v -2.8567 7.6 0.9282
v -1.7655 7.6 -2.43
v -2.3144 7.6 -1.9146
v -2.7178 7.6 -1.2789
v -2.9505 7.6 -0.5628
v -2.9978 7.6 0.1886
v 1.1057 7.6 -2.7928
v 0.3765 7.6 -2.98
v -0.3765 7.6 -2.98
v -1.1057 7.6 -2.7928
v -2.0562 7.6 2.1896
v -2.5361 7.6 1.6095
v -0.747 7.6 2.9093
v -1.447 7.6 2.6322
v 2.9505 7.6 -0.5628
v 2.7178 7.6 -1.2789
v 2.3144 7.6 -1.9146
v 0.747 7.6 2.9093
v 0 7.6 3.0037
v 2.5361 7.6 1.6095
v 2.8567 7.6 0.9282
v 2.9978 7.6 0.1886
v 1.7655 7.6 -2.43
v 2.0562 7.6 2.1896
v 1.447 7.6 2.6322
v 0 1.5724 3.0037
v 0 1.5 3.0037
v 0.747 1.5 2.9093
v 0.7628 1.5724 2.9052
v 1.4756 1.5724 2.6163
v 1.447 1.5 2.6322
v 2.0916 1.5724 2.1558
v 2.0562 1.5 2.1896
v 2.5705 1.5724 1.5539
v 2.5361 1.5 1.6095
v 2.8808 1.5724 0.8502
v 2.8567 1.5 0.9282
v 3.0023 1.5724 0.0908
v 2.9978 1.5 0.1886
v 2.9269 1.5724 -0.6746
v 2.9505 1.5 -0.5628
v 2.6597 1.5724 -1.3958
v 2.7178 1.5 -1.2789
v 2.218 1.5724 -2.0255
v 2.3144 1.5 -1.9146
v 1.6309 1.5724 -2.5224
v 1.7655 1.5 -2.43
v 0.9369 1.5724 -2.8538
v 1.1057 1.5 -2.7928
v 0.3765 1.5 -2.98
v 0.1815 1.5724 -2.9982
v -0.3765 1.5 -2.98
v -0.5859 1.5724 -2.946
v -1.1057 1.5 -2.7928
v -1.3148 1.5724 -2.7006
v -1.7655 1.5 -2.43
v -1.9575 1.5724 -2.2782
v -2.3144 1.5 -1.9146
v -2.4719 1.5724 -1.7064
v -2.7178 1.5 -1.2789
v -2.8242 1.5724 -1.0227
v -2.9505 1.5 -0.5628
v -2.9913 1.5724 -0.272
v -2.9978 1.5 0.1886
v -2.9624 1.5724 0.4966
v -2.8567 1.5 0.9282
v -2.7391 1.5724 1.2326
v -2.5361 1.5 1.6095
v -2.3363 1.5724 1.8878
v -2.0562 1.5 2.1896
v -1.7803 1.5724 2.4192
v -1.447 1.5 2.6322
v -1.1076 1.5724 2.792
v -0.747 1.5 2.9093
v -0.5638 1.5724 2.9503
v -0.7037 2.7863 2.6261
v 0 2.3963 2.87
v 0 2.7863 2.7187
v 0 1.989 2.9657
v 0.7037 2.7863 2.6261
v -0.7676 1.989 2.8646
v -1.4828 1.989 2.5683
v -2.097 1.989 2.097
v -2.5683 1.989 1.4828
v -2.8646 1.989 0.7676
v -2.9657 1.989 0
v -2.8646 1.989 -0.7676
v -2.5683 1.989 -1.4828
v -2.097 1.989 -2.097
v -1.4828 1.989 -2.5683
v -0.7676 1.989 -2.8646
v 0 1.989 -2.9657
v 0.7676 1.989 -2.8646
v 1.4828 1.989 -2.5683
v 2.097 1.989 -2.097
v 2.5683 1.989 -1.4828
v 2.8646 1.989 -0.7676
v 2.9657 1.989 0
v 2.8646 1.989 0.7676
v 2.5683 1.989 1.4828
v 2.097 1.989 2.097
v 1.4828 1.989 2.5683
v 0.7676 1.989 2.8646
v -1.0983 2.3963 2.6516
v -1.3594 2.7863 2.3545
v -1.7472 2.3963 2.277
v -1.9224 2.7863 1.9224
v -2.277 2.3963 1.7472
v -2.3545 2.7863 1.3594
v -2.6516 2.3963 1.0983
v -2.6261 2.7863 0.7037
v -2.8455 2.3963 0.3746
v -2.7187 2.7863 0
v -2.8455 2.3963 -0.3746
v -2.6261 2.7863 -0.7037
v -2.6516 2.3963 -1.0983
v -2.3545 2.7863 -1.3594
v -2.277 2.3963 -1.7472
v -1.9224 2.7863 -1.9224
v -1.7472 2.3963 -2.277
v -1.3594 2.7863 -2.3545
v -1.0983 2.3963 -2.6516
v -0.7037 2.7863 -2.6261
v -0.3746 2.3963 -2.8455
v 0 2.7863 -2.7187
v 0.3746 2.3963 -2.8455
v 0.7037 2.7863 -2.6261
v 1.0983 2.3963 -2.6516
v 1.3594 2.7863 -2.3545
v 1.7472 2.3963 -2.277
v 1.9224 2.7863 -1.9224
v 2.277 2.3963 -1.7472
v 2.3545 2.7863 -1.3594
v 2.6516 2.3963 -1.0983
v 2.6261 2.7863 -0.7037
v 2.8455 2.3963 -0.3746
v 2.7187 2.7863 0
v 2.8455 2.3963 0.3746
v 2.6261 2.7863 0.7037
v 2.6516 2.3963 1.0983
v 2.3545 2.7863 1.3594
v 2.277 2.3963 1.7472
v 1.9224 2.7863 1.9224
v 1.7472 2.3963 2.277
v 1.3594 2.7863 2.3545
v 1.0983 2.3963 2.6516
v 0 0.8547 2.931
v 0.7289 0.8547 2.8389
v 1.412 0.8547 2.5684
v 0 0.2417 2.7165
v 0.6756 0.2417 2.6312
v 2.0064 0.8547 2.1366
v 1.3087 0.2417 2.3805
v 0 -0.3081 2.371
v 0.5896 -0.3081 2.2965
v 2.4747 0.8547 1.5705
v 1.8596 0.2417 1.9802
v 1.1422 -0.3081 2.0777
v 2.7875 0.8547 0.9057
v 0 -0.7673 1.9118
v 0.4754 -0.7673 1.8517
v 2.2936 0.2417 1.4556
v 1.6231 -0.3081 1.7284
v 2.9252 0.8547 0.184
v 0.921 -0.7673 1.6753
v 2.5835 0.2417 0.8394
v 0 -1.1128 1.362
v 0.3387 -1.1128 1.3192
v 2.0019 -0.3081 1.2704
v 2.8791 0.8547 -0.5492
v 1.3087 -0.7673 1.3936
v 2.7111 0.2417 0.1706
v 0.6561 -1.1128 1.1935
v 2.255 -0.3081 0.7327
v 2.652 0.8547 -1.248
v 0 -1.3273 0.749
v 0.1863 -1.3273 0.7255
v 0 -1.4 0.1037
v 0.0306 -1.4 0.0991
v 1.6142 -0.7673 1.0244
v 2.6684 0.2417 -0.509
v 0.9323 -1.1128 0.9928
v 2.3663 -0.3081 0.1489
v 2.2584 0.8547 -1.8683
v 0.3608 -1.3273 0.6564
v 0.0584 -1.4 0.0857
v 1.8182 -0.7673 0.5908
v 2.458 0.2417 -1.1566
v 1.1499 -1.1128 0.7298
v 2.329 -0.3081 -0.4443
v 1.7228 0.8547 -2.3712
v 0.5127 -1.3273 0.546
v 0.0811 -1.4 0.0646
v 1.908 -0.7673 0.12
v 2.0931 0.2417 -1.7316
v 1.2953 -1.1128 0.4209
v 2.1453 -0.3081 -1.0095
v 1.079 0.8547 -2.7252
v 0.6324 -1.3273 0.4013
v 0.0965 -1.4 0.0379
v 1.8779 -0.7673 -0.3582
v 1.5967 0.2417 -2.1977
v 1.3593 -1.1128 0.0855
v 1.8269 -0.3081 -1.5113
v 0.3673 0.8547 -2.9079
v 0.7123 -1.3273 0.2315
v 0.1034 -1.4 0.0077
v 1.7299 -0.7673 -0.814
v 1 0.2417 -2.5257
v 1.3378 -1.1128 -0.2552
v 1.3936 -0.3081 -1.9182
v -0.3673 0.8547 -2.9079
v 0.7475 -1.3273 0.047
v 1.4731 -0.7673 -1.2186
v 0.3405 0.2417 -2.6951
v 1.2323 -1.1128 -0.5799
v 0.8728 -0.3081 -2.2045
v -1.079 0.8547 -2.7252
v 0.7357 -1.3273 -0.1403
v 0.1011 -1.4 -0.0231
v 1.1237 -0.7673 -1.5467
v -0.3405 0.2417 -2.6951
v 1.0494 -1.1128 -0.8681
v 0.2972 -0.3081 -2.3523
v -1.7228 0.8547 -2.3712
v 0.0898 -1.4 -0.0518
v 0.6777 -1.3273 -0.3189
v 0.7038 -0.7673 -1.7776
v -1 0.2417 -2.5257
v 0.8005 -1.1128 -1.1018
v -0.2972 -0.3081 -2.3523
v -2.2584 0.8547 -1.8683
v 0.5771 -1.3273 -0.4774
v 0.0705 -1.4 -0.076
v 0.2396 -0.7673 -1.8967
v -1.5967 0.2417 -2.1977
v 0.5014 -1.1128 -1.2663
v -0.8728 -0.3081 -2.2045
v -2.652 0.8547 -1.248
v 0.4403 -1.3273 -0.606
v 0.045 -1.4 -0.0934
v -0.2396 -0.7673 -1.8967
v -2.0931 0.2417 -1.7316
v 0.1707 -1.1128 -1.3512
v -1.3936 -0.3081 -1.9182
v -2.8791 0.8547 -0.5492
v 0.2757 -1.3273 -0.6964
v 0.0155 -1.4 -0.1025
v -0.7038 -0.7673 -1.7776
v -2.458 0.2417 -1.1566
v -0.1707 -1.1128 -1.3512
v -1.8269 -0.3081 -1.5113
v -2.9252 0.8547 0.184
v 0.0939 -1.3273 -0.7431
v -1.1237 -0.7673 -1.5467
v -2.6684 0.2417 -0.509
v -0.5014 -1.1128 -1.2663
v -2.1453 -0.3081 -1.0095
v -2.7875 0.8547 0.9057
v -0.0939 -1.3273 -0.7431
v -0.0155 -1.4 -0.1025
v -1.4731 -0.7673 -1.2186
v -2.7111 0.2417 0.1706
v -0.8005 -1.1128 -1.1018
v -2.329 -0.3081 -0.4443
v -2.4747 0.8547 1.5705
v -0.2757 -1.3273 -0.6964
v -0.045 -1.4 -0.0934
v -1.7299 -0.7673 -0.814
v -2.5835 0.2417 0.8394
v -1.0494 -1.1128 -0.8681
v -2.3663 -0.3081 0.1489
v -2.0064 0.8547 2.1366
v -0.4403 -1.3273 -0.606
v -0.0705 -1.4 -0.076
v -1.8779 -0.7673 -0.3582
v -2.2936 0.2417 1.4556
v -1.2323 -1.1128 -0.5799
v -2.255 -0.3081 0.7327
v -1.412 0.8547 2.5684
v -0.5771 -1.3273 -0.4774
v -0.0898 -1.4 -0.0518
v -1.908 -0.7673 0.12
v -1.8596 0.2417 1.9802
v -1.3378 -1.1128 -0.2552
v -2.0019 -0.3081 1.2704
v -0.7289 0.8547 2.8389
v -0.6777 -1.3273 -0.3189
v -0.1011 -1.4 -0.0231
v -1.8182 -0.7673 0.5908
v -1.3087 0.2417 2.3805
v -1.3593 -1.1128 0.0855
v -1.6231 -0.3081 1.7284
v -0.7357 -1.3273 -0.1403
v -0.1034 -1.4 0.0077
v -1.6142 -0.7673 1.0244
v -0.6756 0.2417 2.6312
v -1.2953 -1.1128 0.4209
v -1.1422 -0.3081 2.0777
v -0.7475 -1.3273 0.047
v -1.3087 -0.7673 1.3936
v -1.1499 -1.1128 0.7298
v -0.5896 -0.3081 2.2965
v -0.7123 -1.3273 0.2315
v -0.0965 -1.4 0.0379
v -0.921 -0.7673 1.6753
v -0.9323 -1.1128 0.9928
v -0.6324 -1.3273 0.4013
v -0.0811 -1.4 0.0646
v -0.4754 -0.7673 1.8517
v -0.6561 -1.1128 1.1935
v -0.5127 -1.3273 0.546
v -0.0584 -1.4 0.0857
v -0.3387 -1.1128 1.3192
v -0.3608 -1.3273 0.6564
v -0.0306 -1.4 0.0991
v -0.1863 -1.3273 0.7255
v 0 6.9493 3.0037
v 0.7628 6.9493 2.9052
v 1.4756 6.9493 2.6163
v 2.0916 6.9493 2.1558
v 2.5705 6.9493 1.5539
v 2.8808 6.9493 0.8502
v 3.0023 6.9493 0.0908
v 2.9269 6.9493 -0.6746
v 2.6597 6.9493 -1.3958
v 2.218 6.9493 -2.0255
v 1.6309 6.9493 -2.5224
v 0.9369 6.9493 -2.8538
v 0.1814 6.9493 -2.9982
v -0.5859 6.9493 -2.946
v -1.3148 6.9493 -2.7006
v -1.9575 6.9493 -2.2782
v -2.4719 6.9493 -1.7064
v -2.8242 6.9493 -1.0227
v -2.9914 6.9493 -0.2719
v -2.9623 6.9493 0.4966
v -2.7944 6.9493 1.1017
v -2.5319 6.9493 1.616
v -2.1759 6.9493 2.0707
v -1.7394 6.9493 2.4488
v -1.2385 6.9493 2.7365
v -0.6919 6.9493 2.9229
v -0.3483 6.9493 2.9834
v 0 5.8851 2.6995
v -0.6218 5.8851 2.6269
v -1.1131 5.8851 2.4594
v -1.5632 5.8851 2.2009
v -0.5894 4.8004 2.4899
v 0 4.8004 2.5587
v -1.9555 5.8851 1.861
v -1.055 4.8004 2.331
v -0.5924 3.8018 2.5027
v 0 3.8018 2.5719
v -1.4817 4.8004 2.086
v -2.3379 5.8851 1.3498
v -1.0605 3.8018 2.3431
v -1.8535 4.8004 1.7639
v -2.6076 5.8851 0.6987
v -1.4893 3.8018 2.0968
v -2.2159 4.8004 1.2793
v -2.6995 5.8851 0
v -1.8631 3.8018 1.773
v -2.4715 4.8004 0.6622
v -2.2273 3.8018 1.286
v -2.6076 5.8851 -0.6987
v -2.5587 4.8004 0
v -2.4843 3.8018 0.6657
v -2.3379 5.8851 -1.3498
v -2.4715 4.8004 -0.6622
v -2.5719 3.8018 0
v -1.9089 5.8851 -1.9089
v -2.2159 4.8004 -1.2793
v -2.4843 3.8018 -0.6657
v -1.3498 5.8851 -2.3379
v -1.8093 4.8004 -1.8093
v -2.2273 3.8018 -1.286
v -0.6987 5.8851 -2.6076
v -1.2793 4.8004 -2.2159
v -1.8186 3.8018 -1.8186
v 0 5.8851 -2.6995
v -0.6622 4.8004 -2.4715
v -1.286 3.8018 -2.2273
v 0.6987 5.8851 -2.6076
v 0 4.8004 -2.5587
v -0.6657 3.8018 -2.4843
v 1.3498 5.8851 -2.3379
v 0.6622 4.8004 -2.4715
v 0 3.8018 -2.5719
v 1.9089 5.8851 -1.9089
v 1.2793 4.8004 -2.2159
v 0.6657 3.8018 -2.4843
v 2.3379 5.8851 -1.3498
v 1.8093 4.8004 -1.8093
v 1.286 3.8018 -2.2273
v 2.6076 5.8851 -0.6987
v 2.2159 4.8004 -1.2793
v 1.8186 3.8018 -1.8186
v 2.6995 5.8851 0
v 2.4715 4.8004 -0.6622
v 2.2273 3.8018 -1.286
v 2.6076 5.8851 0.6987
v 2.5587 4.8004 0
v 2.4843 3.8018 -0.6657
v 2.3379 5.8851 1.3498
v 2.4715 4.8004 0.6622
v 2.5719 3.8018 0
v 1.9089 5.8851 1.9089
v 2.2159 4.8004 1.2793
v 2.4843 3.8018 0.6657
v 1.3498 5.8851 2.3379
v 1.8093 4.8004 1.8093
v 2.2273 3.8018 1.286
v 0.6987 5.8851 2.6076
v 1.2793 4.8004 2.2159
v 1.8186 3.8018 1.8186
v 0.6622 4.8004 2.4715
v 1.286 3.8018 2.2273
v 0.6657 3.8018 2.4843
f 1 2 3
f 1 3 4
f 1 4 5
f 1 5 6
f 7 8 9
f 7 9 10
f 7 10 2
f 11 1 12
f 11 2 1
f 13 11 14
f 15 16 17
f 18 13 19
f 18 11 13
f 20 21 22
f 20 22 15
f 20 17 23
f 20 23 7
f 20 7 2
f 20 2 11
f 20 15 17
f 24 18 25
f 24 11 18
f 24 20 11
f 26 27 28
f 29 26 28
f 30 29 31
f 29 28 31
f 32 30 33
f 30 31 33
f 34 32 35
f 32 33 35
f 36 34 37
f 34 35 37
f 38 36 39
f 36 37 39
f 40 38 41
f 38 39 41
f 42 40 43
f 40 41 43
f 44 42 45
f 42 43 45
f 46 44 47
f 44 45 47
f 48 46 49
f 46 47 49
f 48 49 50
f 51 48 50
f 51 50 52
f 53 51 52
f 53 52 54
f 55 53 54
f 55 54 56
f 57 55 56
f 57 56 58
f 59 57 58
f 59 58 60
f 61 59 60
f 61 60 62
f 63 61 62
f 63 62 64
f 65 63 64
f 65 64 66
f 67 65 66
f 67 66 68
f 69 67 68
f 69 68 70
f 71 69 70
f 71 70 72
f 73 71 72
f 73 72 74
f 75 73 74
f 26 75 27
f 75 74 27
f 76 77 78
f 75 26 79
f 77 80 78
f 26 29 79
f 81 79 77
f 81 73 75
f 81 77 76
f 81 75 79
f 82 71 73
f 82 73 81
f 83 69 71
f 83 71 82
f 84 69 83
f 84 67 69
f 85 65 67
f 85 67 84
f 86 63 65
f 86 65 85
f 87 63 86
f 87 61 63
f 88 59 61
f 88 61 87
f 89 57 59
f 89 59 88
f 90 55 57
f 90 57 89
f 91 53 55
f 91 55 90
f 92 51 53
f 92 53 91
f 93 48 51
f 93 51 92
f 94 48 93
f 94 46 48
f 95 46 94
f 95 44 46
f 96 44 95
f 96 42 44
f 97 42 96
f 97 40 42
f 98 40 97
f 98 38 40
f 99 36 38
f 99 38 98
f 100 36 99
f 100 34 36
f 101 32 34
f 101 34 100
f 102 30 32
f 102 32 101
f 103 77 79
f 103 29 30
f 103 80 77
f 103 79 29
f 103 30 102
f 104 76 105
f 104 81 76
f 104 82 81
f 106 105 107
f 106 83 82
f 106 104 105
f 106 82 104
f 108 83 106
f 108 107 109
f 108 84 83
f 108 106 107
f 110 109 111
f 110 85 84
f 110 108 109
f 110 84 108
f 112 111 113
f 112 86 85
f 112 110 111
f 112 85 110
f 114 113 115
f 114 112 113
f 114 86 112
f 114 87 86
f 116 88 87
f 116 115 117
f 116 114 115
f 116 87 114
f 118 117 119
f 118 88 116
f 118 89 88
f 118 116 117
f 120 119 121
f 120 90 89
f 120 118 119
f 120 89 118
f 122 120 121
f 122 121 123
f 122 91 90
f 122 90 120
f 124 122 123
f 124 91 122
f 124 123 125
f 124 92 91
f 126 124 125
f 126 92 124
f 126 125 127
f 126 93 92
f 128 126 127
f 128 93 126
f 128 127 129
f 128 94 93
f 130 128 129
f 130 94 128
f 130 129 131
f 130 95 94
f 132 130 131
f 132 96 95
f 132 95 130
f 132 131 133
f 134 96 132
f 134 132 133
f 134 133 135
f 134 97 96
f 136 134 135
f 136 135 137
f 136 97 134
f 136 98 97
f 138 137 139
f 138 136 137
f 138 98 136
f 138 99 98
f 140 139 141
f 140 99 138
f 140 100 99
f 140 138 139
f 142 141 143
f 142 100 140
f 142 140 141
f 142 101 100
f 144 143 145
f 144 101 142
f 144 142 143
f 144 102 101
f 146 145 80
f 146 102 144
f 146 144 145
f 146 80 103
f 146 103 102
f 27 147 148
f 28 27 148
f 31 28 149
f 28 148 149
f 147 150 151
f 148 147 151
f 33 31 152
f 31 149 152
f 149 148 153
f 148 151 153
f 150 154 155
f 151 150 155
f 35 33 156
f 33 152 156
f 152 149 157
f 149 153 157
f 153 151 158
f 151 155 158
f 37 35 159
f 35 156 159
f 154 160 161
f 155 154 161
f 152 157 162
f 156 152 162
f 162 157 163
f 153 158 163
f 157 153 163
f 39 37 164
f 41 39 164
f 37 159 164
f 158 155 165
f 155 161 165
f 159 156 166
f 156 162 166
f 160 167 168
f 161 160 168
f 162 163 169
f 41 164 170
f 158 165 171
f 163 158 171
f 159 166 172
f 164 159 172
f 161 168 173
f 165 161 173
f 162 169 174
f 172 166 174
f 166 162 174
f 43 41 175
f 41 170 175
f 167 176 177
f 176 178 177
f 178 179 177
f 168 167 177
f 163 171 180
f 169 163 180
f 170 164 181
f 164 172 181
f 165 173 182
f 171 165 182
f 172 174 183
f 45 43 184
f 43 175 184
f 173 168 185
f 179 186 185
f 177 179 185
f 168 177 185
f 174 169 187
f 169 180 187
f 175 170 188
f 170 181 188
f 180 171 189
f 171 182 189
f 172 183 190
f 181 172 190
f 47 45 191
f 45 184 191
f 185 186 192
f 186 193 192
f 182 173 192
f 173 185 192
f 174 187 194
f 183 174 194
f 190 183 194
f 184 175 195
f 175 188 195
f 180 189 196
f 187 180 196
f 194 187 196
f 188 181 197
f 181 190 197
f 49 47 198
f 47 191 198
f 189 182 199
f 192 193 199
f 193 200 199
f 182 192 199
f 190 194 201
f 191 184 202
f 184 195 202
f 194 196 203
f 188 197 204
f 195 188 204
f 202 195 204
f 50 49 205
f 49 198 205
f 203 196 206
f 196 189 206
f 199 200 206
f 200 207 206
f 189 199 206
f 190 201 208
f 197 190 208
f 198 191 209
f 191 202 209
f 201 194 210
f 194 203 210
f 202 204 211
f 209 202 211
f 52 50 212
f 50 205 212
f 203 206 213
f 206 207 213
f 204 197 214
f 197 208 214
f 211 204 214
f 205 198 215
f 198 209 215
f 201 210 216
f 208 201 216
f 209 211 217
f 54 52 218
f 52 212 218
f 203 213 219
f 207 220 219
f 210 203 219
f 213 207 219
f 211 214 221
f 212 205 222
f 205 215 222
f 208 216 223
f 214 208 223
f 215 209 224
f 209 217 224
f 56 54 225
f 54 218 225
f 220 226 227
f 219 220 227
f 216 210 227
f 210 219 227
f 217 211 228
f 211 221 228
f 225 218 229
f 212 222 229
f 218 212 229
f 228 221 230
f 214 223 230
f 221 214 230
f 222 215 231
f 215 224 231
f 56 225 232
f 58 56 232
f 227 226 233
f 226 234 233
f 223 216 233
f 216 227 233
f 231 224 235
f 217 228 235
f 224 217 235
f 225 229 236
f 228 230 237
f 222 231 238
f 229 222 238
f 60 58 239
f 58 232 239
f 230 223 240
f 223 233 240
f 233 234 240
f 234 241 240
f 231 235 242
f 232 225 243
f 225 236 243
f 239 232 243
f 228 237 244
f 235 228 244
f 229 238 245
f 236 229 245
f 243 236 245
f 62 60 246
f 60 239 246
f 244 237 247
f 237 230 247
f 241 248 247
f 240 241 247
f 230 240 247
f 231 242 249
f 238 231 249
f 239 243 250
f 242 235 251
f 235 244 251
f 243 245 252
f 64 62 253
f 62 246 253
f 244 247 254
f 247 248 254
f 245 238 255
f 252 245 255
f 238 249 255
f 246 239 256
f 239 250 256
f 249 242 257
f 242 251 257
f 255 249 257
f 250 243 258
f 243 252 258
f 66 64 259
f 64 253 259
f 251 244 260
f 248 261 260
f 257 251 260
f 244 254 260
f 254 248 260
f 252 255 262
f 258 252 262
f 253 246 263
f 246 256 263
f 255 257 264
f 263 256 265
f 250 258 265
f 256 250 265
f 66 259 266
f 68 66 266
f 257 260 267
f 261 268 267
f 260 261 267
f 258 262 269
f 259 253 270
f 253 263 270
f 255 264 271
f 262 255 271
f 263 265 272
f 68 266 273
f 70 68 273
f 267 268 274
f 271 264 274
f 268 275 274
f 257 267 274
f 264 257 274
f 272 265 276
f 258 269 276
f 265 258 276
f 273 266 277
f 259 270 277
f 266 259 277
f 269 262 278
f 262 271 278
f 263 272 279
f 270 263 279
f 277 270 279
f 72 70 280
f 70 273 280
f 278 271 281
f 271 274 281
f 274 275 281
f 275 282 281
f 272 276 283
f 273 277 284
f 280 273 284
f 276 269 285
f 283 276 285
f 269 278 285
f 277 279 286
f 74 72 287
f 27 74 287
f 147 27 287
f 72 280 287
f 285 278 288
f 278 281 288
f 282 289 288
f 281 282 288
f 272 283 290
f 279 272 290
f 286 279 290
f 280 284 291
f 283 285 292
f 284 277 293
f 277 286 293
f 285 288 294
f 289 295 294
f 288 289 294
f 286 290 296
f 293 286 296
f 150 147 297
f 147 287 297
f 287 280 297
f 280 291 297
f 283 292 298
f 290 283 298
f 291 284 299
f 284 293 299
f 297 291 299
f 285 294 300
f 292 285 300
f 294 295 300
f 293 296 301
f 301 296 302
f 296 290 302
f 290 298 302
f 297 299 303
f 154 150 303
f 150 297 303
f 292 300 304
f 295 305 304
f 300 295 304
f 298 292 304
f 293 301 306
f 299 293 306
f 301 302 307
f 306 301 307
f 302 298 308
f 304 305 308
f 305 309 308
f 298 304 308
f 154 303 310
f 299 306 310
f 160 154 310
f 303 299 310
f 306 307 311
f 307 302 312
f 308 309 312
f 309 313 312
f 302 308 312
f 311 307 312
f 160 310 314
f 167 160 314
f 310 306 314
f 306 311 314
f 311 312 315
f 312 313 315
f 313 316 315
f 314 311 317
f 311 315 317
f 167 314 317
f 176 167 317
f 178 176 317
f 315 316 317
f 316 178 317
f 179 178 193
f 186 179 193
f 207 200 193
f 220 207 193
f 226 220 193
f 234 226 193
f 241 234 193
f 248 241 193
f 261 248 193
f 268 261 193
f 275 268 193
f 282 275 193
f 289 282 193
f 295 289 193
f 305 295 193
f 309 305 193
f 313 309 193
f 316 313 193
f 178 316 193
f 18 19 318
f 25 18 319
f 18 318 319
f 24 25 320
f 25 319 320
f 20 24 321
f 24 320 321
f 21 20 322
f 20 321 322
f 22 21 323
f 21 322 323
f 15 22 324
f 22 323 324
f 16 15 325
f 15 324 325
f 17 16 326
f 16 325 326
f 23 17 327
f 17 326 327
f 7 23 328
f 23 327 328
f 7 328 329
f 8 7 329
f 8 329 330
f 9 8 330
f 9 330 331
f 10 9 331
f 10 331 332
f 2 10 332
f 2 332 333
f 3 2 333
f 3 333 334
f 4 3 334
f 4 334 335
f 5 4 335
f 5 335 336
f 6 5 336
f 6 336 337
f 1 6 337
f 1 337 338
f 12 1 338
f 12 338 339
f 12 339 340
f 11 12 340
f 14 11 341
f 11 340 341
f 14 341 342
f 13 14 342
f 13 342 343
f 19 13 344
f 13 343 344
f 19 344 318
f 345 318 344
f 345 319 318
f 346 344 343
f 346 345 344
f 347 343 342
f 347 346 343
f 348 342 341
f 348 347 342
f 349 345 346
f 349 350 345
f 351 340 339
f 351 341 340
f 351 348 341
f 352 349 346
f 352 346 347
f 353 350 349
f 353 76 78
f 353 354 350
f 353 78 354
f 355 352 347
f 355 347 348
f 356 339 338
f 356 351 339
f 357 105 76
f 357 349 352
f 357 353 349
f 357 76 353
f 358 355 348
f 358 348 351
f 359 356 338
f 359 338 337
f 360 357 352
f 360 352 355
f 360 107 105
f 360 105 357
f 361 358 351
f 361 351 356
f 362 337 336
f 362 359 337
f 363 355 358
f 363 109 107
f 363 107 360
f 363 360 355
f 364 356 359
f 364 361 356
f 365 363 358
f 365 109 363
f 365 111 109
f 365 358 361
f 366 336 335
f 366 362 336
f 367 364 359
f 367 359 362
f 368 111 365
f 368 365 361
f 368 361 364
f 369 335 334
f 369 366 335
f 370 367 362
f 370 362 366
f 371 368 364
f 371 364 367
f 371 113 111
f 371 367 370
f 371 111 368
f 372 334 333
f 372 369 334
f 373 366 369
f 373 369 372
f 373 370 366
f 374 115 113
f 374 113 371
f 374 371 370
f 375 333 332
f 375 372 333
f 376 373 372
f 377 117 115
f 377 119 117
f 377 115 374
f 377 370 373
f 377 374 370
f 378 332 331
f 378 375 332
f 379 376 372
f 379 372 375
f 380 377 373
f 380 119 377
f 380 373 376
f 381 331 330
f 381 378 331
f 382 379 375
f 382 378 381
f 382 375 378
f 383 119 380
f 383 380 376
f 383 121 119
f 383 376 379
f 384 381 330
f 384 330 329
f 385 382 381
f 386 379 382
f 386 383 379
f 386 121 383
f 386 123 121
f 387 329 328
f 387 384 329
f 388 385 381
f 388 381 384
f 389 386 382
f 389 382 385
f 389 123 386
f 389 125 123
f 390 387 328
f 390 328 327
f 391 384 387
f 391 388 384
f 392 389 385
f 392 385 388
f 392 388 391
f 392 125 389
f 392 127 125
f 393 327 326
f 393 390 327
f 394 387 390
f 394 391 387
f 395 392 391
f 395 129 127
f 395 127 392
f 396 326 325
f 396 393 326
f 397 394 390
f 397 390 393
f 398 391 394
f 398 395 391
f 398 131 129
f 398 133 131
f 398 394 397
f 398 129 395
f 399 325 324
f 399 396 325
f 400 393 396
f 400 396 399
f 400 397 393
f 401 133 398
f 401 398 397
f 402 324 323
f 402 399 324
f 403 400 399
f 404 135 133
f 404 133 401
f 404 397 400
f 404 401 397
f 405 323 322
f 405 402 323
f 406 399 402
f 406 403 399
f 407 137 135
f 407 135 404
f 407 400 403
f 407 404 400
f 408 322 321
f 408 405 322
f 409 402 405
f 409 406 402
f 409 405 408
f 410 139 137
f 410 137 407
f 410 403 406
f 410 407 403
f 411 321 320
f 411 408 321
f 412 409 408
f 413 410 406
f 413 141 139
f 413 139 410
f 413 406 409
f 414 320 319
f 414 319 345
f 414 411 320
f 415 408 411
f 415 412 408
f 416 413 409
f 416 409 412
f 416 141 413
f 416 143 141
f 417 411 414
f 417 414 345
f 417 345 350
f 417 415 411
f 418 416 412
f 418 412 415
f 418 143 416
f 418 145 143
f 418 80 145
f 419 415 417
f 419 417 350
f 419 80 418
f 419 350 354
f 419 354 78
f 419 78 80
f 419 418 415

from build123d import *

# Parameters (mm, degrees)
SKETCH_2_R      = 3.003688101
EXTRUDE_1_DEPTH = 9
FILLET_1_R      = 2.9


with BuildPart() as part:
    # 草图2 → 凸台-拉伸1 (new body)
    with BuildSketch(Plane(origin=(0, -1.4, 0), x_dir=(1, 0, 0), z_dir=(0, 1, 0))):
        with Locations(Location((0, 0, 0), (0, 0, 270))):
            Circle(SKETCH_2_R)
    extrude(amount=EXTRUDE_1_DEPTH)

    # 圆角1
    fillet_1_edges = [part.edges().sort_by_distance(p)[0] for p in [
        (0, -1.4, -3.003688101),
    ]]
    fillet(fillet_1_edges, radius=FILLET_1_R)

    # 草图3 → 切除-旋转2 (revolve, cut)
    with BuildSketch(Plane(origin=(0, 0, 0), x_dir=(0, 0, -1), z_dir=(1, 0, 0)), mode=Mode.PRIVATE) as cut_revolve_2_sk:
        with BuildLine():
            Line((3.004365599, 1.508670114), (3.004365599, 6.951153744))
            add(Edge.make_bspline(
                [(3.004365599, 6.951153744), (2.268764656, 4.943240983), (2.718706105, 2.786306846)],
                knots=[0, 0, 0, 1, 1, 1], degree=2))
            ThreePointArc((2.718706105, 2.786306846), (2.932079854, 2.16326101), (3.004365599, 1.508670114))
        make_face()
    revolve(cut_revolve_2_sk.sketch.rotate(Axis((0, 7.6, 0), (0, -1, 0)), 180), axis=Axis((0, 7.6, 0), (0, -1, 0)), mode=Mode.SUBTRACT)


solid = part.part
